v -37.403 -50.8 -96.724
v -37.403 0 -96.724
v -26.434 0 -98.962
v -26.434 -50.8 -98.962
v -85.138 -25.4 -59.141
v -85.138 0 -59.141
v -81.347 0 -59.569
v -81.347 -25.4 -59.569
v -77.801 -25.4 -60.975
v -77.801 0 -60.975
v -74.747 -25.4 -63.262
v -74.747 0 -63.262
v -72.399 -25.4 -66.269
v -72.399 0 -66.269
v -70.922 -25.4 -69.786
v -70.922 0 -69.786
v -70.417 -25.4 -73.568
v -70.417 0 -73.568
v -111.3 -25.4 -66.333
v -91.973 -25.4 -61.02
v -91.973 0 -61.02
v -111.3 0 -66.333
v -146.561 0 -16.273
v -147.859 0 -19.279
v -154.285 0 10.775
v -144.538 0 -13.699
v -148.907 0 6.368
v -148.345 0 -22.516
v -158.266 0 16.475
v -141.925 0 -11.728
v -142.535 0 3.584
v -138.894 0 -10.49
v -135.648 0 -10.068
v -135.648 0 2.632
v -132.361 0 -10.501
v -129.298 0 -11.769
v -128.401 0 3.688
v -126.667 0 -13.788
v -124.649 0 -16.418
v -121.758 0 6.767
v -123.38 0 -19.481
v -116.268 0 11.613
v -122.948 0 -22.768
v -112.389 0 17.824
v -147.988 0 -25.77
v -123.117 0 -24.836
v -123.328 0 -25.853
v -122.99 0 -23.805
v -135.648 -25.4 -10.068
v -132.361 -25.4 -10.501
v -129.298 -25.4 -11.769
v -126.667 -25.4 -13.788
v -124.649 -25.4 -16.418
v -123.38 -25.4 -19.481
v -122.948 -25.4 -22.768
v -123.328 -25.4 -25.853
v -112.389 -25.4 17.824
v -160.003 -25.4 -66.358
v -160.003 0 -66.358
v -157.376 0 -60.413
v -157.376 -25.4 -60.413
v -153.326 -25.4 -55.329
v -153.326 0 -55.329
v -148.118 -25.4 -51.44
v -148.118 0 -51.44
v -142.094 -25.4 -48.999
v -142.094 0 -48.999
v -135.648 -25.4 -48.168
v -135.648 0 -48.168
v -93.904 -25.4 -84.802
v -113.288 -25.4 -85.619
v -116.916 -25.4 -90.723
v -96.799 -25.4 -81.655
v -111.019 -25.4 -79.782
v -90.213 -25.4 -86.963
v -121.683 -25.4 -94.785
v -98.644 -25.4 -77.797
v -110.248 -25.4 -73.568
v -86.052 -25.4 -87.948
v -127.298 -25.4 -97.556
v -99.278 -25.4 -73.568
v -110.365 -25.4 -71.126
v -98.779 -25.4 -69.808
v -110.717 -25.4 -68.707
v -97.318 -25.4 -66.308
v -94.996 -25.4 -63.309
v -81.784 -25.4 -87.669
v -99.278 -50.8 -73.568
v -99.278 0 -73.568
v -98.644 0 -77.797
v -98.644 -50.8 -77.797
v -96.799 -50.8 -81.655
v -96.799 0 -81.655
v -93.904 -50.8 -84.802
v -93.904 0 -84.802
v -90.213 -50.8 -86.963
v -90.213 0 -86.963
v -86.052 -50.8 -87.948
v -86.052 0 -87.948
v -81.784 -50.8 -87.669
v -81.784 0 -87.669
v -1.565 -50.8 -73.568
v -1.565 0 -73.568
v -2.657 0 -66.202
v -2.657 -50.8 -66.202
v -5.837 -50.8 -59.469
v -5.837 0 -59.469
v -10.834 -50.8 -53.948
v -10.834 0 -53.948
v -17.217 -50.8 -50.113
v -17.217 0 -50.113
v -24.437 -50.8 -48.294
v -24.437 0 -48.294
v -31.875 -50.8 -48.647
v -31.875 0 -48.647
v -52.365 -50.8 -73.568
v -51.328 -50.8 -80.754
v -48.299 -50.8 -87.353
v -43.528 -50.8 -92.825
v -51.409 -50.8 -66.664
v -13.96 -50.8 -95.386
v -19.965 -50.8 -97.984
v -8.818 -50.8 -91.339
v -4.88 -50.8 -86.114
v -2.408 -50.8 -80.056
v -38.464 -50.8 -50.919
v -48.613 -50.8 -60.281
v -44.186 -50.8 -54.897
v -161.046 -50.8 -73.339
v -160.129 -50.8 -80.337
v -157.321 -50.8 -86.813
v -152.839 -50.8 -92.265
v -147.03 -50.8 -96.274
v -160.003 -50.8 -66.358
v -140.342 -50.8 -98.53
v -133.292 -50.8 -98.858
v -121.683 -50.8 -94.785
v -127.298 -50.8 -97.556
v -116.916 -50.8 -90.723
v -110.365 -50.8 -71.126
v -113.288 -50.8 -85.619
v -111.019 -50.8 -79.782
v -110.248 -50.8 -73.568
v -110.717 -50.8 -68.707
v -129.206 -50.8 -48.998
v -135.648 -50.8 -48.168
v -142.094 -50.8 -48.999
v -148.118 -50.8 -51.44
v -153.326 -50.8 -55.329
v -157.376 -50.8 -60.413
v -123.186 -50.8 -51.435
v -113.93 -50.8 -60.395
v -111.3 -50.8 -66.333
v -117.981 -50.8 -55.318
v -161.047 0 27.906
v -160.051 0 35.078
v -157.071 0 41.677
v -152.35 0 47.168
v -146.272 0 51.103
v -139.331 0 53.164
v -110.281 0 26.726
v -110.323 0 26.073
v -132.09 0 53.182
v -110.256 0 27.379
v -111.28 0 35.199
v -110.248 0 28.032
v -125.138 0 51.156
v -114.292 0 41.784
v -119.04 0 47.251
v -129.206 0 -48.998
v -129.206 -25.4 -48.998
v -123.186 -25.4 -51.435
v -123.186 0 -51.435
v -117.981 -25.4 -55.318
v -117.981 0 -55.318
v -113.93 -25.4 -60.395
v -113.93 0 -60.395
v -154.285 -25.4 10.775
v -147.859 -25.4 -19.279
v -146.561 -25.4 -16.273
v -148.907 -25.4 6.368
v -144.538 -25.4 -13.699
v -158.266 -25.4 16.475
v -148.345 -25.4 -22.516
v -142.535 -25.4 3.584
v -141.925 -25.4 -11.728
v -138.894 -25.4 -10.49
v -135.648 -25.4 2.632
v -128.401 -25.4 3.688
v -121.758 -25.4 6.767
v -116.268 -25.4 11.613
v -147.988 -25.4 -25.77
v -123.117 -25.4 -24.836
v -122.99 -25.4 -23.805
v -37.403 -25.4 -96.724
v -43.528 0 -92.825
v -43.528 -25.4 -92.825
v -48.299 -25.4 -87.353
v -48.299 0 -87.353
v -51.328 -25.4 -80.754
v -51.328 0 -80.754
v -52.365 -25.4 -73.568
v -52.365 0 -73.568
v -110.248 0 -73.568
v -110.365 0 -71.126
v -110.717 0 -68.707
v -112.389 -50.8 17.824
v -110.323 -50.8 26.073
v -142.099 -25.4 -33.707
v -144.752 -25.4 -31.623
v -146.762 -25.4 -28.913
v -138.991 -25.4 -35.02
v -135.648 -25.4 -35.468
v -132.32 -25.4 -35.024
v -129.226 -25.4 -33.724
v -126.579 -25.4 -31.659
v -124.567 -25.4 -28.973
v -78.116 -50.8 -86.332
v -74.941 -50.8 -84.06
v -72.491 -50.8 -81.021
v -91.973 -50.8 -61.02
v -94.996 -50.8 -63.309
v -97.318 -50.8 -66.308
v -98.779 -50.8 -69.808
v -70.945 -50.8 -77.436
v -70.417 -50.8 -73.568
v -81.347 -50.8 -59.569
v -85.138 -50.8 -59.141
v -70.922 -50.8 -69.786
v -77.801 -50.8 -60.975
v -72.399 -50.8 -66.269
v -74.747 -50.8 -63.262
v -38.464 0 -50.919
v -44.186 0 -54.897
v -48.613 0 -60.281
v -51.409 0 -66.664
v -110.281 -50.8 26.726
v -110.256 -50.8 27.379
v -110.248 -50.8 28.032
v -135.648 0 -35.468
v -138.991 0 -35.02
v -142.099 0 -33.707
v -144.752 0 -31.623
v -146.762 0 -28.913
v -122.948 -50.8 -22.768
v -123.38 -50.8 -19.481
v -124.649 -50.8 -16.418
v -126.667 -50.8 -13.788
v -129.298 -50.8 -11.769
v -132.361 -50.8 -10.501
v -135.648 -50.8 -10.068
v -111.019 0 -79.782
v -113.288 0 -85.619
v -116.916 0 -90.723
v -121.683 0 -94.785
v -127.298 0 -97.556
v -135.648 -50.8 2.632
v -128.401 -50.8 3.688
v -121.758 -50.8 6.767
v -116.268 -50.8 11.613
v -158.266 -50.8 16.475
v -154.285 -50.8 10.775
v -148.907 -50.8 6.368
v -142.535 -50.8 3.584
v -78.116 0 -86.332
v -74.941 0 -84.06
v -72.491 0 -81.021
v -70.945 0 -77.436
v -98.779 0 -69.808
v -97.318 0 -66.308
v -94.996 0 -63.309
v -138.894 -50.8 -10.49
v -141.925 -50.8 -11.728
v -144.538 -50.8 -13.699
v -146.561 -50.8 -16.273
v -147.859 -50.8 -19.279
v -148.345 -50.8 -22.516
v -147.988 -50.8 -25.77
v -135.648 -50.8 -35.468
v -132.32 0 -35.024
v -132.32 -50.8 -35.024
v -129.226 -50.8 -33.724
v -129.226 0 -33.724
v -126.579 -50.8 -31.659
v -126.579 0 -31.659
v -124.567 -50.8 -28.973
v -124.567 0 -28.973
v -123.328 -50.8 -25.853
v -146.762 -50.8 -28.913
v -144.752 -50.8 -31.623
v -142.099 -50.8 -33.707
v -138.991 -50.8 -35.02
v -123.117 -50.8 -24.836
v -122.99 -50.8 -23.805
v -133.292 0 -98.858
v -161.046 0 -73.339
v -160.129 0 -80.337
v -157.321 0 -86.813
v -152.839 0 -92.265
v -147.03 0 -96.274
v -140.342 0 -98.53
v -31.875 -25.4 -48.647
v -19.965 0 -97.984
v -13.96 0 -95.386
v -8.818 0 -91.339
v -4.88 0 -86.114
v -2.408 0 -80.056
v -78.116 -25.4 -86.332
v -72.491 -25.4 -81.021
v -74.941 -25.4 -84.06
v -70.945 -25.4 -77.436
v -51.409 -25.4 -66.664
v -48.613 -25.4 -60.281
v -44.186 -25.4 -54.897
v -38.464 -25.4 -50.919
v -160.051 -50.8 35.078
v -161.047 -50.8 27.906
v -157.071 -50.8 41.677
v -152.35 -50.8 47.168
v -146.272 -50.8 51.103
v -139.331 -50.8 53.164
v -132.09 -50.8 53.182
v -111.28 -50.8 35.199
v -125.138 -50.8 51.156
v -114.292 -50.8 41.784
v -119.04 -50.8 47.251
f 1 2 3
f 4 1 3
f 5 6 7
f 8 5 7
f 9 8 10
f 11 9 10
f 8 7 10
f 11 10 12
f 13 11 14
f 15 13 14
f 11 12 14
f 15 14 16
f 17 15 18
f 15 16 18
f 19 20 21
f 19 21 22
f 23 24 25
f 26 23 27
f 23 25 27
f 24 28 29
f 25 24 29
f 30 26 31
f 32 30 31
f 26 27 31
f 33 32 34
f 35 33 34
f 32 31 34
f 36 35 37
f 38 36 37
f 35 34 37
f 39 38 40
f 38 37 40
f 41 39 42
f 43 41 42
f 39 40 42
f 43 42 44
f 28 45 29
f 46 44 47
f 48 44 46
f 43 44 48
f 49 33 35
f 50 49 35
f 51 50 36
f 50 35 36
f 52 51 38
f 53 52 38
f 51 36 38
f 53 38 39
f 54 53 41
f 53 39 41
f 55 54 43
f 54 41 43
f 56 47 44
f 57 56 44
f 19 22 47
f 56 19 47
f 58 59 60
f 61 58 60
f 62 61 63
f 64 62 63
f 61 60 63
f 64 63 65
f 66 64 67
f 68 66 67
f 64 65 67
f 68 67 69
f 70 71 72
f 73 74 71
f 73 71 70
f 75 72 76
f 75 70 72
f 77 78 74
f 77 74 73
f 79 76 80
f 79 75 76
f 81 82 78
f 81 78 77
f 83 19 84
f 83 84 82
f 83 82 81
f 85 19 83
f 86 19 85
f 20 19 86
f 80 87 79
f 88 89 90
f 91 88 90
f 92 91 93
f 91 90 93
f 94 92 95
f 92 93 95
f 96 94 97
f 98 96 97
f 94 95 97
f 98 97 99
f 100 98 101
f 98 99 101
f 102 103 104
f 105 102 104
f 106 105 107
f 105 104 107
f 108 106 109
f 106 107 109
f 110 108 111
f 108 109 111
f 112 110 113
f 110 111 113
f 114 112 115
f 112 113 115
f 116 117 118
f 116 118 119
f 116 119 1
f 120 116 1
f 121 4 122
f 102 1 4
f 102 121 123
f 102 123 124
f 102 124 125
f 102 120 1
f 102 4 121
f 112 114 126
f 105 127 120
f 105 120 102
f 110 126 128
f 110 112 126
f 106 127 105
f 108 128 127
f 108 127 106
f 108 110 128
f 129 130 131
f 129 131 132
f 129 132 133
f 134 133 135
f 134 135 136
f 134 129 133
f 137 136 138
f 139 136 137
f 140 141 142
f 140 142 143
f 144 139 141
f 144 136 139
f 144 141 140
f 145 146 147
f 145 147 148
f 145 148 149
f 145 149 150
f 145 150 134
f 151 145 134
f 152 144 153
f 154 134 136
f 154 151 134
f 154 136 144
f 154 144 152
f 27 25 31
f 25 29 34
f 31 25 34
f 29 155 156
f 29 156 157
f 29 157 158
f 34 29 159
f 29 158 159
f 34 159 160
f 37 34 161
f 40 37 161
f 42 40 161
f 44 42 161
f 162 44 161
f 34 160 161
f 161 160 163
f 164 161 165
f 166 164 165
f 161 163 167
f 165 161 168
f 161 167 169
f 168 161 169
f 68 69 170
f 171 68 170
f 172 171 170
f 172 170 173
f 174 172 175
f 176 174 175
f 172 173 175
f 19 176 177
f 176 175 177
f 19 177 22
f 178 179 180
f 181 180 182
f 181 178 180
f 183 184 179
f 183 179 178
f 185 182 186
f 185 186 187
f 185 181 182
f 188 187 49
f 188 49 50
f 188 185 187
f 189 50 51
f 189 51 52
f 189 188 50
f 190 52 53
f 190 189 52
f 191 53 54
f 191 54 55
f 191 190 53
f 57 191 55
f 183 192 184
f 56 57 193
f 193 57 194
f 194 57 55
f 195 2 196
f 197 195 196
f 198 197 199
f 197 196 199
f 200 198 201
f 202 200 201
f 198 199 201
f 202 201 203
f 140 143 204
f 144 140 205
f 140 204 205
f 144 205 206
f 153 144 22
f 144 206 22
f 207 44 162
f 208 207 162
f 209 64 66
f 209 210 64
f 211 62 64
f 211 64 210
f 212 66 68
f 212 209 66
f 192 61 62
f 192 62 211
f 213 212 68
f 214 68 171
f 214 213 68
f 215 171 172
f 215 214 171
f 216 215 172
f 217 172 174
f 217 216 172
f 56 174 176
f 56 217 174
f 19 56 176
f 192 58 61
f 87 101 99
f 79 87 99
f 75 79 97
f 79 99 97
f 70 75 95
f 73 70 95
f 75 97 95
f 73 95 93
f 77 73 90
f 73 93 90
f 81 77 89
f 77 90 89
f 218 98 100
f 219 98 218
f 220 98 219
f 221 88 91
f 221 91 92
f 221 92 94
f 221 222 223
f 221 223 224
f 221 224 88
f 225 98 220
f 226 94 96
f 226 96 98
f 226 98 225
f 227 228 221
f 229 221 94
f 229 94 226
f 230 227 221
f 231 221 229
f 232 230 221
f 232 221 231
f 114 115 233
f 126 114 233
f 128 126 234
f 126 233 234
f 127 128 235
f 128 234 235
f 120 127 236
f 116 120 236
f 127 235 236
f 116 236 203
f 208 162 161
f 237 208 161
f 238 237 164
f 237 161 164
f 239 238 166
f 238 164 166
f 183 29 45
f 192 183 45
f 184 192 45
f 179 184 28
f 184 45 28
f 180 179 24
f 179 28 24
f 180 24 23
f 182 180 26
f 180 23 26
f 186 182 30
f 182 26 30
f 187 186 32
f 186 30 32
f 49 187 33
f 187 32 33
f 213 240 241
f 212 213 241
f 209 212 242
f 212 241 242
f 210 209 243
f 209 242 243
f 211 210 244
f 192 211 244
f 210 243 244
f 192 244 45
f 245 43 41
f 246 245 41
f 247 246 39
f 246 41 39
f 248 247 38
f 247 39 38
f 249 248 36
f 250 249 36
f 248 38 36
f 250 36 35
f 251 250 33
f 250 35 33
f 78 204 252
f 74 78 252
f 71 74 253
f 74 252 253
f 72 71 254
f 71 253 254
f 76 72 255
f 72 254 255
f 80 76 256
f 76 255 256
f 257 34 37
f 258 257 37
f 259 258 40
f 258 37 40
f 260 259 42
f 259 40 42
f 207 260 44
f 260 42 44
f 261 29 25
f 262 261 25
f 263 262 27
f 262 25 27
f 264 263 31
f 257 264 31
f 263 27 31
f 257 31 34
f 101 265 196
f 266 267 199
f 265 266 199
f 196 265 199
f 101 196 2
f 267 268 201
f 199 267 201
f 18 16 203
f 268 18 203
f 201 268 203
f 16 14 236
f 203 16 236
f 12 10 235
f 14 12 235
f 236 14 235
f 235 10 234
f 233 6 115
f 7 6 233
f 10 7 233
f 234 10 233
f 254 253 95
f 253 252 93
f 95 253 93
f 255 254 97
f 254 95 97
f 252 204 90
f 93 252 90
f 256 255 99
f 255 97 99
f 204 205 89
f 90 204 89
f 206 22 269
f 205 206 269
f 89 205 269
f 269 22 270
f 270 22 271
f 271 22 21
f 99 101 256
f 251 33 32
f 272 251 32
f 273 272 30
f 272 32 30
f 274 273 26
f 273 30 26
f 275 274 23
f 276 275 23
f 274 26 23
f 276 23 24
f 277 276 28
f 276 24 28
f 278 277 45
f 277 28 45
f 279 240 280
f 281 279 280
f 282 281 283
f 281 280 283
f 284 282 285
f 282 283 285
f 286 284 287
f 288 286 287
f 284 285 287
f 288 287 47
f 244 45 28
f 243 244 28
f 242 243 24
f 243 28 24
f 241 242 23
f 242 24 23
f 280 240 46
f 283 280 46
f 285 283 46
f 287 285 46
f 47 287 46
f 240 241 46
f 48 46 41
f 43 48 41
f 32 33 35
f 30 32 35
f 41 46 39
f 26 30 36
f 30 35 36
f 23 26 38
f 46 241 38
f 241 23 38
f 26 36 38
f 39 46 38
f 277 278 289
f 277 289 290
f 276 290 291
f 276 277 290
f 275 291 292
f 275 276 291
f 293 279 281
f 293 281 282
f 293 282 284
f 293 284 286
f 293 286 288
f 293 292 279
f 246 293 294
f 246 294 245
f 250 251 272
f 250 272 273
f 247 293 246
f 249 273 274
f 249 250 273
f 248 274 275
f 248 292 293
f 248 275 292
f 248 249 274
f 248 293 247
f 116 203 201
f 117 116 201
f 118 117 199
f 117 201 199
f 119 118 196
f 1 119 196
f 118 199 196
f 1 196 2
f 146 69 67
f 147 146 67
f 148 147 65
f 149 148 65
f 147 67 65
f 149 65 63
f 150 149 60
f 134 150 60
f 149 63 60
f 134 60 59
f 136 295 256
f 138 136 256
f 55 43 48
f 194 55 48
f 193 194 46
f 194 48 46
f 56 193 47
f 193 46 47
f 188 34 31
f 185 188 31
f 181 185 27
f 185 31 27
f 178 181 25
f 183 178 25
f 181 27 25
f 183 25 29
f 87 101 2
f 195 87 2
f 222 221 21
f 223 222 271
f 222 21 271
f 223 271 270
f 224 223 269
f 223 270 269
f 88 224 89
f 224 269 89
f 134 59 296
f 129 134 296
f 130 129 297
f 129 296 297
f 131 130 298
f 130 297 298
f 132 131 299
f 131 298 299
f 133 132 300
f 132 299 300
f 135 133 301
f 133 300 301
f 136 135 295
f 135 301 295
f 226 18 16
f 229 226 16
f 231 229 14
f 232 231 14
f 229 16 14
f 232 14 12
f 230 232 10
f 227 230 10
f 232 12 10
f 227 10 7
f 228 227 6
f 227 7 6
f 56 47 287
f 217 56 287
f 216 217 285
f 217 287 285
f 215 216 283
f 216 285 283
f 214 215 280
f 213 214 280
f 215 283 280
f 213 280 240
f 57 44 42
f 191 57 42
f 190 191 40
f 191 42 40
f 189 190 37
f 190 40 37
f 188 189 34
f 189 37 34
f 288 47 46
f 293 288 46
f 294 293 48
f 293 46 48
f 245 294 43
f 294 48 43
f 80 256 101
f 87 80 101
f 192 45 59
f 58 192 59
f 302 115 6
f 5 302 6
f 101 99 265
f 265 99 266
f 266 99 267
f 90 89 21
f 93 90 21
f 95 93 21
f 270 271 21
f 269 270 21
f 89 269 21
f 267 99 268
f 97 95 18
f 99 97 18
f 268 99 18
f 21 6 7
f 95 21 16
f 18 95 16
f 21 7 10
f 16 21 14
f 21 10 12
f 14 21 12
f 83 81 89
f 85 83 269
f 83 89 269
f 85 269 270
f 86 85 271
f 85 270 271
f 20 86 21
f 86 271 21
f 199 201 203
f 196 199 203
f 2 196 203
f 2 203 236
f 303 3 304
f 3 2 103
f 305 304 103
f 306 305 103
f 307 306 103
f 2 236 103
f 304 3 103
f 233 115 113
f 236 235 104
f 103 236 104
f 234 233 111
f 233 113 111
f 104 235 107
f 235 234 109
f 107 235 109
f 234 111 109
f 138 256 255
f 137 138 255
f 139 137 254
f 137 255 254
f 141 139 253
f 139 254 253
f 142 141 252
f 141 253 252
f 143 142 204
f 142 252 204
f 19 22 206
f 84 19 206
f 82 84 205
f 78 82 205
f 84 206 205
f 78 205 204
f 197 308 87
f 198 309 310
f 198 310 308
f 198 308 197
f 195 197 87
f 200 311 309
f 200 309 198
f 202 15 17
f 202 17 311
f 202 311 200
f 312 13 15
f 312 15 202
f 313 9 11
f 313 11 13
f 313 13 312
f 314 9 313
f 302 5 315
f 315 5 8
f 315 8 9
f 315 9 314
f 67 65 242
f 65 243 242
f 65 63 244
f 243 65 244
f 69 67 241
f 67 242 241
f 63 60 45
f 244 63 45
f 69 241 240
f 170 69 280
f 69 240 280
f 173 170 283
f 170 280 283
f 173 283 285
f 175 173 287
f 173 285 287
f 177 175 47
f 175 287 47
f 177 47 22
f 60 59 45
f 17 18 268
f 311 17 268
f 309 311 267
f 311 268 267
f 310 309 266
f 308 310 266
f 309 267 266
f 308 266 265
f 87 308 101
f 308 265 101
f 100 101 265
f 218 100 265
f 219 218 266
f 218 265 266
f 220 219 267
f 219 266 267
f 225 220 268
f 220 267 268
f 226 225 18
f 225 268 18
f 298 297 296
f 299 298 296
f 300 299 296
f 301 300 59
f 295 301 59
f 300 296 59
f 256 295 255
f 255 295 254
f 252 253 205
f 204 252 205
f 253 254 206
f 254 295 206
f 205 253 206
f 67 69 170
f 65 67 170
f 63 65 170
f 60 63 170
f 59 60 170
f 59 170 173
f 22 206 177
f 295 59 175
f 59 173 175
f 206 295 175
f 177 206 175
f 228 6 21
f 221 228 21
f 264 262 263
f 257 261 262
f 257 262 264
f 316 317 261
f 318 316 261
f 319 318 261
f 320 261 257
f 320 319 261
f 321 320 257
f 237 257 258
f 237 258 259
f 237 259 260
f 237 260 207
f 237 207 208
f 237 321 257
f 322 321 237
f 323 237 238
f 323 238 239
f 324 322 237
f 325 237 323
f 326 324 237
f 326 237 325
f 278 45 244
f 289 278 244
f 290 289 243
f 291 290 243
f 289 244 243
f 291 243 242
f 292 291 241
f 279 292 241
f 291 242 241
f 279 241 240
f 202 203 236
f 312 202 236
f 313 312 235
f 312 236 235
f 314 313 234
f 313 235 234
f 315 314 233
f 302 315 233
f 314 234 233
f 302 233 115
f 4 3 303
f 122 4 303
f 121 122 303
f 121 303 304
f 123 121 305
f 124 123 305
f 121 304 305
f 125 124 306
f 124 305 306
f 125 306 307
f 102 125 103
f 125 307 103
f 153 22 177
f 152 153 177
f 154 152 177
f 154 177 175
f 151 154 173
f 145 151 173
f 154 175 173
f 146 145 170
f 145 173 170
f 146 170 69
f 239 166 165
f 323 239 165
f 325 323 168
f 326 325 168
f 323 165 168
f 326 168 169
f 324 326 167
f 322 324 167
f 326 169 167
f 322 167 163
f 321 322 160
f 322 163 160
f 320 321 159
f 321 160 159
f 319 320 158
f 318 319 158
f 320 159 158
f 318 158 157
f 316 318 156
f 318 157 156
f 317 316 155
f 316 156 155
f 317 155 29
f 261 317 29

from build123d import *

# Parameters (mm, degrees)
F1_DEPTH = 50.8
F2_DEPTH = 25.4
F3_DEPTH = 25.4


with BuildPart() as f1:
    # F0 (on Front) → F1 (new body)
    with BuildSketch(Plane.XZ):
        with BuildLine():
            ThreePointArc((-135.6475204229, 2.6322072268), (-121.7575693122, 6.7665245868), (-112.3893084383, 17.8236042234))
            Line((-112.3893084383, 17.8236042234), (-110.3231574973, 26.073472326))
            ThreePointArc((-110.3231574973, 26.073472326), (-110.2664367354, 27.0521098619), (-110.2475204229, 28.0322072268))
            ThreePointArc((-110.2475204229, 28.0322072268), (-135.7106894441, 53.4321286769), (-161.0472062241, 27.9058695751))
            Line((-161.0472062241, 27.9058695751), (-158.2661160293, 16.4754285755))
            ThreePointArc((-158.2661160293, 16.4754285755), (-148.9068156956, 6.3676950266), (-135.6475204229, 2.6322072268))
        make_face()
    extrude(amount=F1_DEPTH)


with BuildPart() as f1b:
    # F0 (on Front) → F1, piece 2 (new body)
    with BuildSketch(Plane.XZ):
        with BuildLine():
            Line((-135.6475204229, -22.7677927732), (-135.6475204229, -35.4677927732))
            ThreePointArc((-135.6475204229, -35.4677927732), (-127.8338888359, -32.779643822), (-123.3280061554, -25.8531725248))
            ThreePointArc((-123.3280061554, -25.8531725248), (-123.0430007733, -24.3221686612), (-122.9475204229, -22.7677927732))
            ThreePointArc((-122.9475204229, -22.7677927732), (-126.6672643019, -13.7875366522), (-135.6475204229, -10.0677927732))
            Line((-135.6475204229, -10.0677927732), (-135.6475204229, -22.7677927732))
        make_face()
        with BuildLine():
            ThreePointArc((-147.9875222736, -25.7701842078), (-143.4948011233, -32.7532915394), (-135.6475204229, -35.4677927732))
            Line((-135.6475204229, -35.4677927732), (-135.6475204229, -22.7677927732))
            Line((-135.6475204229, -22.7677927732), (-135.6475204229, -10.0677927732))
            ThreePointArc((-135.6475204229, -10.0677927732), (-145.6330191891, -14.9205120729), (-147.9875222736, -25.7701842078))
        make_face()
    extrude(amount=F1_DEPTH)


with BuildPart() as f1c:
    # F0 (on Front) → F1, piece 3 (new body)
    with BuildSketch(Plane.XZ):
        with BuildLine():
            Line((-110.2475204229, -73.5677927732), (-135.6475204229, -73.5677927732))
            Line((-135.6475204229, -73.5677927732), (-135.6475204229, -48.1677927732))
            ThreePointArc((-135.6475204229, -48.1677927732), (-150.8466701381, -53.2172191219), (-160.0027500068, -66.3578834869))
            ThreePointArc((-160.0027500068, -66.3578834869), (-155.2704840191, -89.695387129), (-133.2915255646, -98.8582907562))
            Line((-133.2915255646, -98.8582907562), (-127.2983209217, -97.5563497888))
            ThreePointArc((-127.2983209217, -97.5563497888), (-114.9445053366, -88.2832664773), (-110.2475204229, -73.5677927732))
        make_face()
        with BuildLine():
            Line((-135.6475204229, -48.1677927732), (-135.6475204229, -73.5677927732))
            Line((-135.6475204229, -73.5677927732), (-110.2475204229, -73.5677927732))
            ThreePointArc((-110.2475204229, -73.5677927732), (-110.5119359179, -69.9123322565), (-111.299677241, -66.332978858))
            ThreePointArc((-111.299677241, -66.332978858), (-120.4587790901, -53.2094496009), (-135.6475204229, -48.1677927732))
        make_face()
    extrude(amount=F1_DEPTH)


with BuildPart() as f1d:
    # F0 (on Front) → F1, piece 4 (new body)
    with BuildSketch(Plane.XZ):
        with BuildLine():
            Line((-84.8475204229, -73.5677927732), (-99.2776616229, -73.5677927732))
            ThreePointArc((-99.2776616229, -73.5677927732), (-93.9035986696, -84.8024009925), (-81.7842192384, -87.6690395587))
            ThreePointArc((-81.7842192384, -87.6690395587), (-73.6129122036, -82.6238710199), (-70.417379223, -73.5677927732))
            Line((-70.417379223, -73.5677927732), (-77.7653604746, -73.5677927732))
            Line((-77.7653604746, -73.5677927732), (-84.8475204229, -73.5677927732))
        make_face()
        with BuildLine():
            ThreePointArc((-91.972907521, -61.0195724312), (-97.3184730125, -66.308018909), (-99.2776616229, -73.5677927732))
            Line((-99.2776616229, -73.5677927732), (-84.8475204229, -73.5677927732))
            Line((-84.8475204229, -73.5677927732), (-77.7653604746, -73.5677927732))
            Line((-77.7653604746, -73.5677927732), (-70.417379223, -73.5677927732))
            ThreePointArc((-70.417379223, -73.5677927732), (-74.7472153019, -63.2618327737), (-85.1383455726, -59.1405825168))
            Line((-85.1383455726, -59.1405825168), (-91.972907521, -61.0195724312))
        make_face()
    extrude(amount=F1_DEPTH)


with BuildPart() as f1e:
    # F0 (on Front) → F1, piece 5 (new body)
    with BuildSketch(Plane.XZ):
        with BuildLine():
            ThreePointArc((-52.3653604746, -73.5677927732), (-48.299196742, -87.3528364844), (-37.4025707016, -96.7243176135))
            Line((-37.4025707016, -96.7243176135), (-26.4341031252, -98.9622363708))
            ThreePointArc((-26.4341031252, -98.9622363708), (-8.8179923916, -91.3394846359), (-1.5653604746, -73.5677927732))
            ThreePointArc((-1.5653604746, -73.5677927732), (-10.8338702898, -53.9480317039), (-31.8752049169, -48.6468492206))
            ThreePointArc((-31.8752049169, -48.6468492206), (-46.5851215439, -57.4363025884), (-52.3653604746, -73.5677927732))
        make_face()
    extrude(amount=F1_DEPTH)


with BuildPart() as f2:
    # F0 (on Front) → F2 (new body)
    with BuildSketch(Plane.XZ):
        with BuildLine():
            Line((-158.2661160293, 16.4754285755), (-147.9875222736, -25.7701842078))
            ThreePointArc((-147.9875222736, -25.7701842078), (-145.6330191891, -14.9205120729), (-135.6475204229, -10.0677927732))
            Line((-135.6475204229, -10.0677927732), (-135.6475204229, 2.6322072268))
            ThreePointArc((-135.6475204229, 2.6322072268), (-148.9068156956, 6.3676950266), (-158.2661160293, 16.4754285755))
        make_face()
        with BuildLine():
            ThreePointArc((-122.9475204229, -22.7677927732), (-123.0430007733, -24.3221686612), (-123.3280061554, -25.8531725248))
            Line((-123.3280061554, -25.8531725248), (-112.3893084383, 17.8236042234))
            ThreePointArc((-112.3893084383, 17.8236042234), (-121.7575693122, 6.7665245868), (-135.6475204229, 2.6322072268))
            Line((-135.6475204229, 2.6322072268), (-135.6475204229, -10.0677927732))
            ThreePointArc((-135.6475204229, -10.0677927732), (-126.6672643019, -13.7875366522), (-122.9475204229, -22.7677927732))
        make_face()
    extrude(amount=F2_DEPTH)


with BuildPart() as f2b:
    # F0 (on Front) → F2, piece 2 (new body)
    with BuildSketch(Plane.XZ):
        with BuildLine():
            Line((-135.6475204229, -35.4677927732), (-135.6475204229, -48.1677927732))
            ThreePointArc((-135.6475204229, -48.1677927732), (-120.4587790901, -53.2094496009), (-111.299677241, -66.332978858))
            Line((-111.299677241, -66.332978858), (-123.3280061554, -25.8531725248))
            ThreePointArc((-123.3280061554, -25.8531725248), (-127.8338888359, -32.779643822), (-135.6475204229, -35.4677927732))
        make_face()
        with BuildLine():
            ThreePointArc((-160.0027500068, -66.3578834869), (-150.8466701381, -53.2172191219), (-135.6475204229, -48.1677927732))
            Line((-135.6475204229, -48.1677927732), (-135.6475204229, -35.4677927732))
            ThreePointArc((-135.6475204229, -35.4677927732), (-143.4948011233, -32.7532915394), (-147.9875222736, -25.7701842078))
            Line((-147.9875222736, -25.7701842078), (-160.0027500068, -66.3578834869))
        make_face()
    extrude(amount=F2_DEPTH)


with BuildPart() as f2c:
    # F0 (on Front) → F2, piece 3 (new body)
    with BuildSketch(Plane.XZ):
        with BuildLine():
            Line((-31.8752049169, -48.6468492206), (-85.1383455726, -59.1405825168))
            ThreePointArc((-85.1383455726, -59.1405825168), (-74.7472153019, -63.2618327737), (-70.417379223, -73.5677927732))
            Line((-70.417379223, -73.5677927732), (-52.3653604746, -73.5677927732))
            ThreePointArc((-52.3653604746, -73.5677927732), (-46.5851215439, -57.4363025884), (-31.8752049169, -48.6468492206))
        make_face()
        with BuildLine():
            ThreePointArc((-70.417379223, -73.5677927732), (-73.6129122036, -82.6238710199), (-81.7842192384, -87.6690395587))
            Line((-81.7842192384, -87.6690395587), (-37.4025707016, -96.7243176135))
            ThreePointArc((-37.4025707016, -96.7243176135), (-48.299196742, -87.3528364844), (-52.3653604746, -73.5677927732))
            Line((-52.3653604746, -73.5677927732), (-70.417379223, -73.5677927732))
        make_face()
    extrude(amount=F2_DEPTH)


with BuildPart() as f3:
    # F0 (on Front) → F3 (new body)
    with BuildSketch(Plane.XZ):
        with BuildLine():
            ThreePointArc((-111.299677241, -66.332978858), (-110.5119359179, -69.9123322565), (-110.2475204229, -73.5677927732))
            Line((-110.2475204229, -73.5677927732), (-99.2776616229, -73.5677927732))
            ThreePointArc((-99.2776616229, -73.5677927732), (-97.3184730125, -66.308018909), (-91.972907521, -61.0195724312))
            Line((-91.972907521, -61.0195724312), (-111.299677241, -66.332978858))
        make_face()
        with BuildLine():
            Line((-99.2776616229, -73.5677927732), (-110.2475204229, -73.5677927732))
            ThreePointArc((-110.2475204229, -73.5677927732), (-114.9445053366, -88.2832664773), (-127.2983209217, -97.5563497888))
            Line((-127.2983209217, -97.5563497888), (-81.7842192384, -87.6690395587))
            ThreePointArc((-81.7842192384, -87.6690395587), (-93.9035986696, -84.8024009925), (-99.2776616229, -73.5677927732))
        make_face()
    extrude(amount=F3_DEPTH)


solid = Compound([f1.part, f1b.part, f1c.part, f1d.part, f1e.part, f2.part, f2b.part, f2c.part, f3.part])
